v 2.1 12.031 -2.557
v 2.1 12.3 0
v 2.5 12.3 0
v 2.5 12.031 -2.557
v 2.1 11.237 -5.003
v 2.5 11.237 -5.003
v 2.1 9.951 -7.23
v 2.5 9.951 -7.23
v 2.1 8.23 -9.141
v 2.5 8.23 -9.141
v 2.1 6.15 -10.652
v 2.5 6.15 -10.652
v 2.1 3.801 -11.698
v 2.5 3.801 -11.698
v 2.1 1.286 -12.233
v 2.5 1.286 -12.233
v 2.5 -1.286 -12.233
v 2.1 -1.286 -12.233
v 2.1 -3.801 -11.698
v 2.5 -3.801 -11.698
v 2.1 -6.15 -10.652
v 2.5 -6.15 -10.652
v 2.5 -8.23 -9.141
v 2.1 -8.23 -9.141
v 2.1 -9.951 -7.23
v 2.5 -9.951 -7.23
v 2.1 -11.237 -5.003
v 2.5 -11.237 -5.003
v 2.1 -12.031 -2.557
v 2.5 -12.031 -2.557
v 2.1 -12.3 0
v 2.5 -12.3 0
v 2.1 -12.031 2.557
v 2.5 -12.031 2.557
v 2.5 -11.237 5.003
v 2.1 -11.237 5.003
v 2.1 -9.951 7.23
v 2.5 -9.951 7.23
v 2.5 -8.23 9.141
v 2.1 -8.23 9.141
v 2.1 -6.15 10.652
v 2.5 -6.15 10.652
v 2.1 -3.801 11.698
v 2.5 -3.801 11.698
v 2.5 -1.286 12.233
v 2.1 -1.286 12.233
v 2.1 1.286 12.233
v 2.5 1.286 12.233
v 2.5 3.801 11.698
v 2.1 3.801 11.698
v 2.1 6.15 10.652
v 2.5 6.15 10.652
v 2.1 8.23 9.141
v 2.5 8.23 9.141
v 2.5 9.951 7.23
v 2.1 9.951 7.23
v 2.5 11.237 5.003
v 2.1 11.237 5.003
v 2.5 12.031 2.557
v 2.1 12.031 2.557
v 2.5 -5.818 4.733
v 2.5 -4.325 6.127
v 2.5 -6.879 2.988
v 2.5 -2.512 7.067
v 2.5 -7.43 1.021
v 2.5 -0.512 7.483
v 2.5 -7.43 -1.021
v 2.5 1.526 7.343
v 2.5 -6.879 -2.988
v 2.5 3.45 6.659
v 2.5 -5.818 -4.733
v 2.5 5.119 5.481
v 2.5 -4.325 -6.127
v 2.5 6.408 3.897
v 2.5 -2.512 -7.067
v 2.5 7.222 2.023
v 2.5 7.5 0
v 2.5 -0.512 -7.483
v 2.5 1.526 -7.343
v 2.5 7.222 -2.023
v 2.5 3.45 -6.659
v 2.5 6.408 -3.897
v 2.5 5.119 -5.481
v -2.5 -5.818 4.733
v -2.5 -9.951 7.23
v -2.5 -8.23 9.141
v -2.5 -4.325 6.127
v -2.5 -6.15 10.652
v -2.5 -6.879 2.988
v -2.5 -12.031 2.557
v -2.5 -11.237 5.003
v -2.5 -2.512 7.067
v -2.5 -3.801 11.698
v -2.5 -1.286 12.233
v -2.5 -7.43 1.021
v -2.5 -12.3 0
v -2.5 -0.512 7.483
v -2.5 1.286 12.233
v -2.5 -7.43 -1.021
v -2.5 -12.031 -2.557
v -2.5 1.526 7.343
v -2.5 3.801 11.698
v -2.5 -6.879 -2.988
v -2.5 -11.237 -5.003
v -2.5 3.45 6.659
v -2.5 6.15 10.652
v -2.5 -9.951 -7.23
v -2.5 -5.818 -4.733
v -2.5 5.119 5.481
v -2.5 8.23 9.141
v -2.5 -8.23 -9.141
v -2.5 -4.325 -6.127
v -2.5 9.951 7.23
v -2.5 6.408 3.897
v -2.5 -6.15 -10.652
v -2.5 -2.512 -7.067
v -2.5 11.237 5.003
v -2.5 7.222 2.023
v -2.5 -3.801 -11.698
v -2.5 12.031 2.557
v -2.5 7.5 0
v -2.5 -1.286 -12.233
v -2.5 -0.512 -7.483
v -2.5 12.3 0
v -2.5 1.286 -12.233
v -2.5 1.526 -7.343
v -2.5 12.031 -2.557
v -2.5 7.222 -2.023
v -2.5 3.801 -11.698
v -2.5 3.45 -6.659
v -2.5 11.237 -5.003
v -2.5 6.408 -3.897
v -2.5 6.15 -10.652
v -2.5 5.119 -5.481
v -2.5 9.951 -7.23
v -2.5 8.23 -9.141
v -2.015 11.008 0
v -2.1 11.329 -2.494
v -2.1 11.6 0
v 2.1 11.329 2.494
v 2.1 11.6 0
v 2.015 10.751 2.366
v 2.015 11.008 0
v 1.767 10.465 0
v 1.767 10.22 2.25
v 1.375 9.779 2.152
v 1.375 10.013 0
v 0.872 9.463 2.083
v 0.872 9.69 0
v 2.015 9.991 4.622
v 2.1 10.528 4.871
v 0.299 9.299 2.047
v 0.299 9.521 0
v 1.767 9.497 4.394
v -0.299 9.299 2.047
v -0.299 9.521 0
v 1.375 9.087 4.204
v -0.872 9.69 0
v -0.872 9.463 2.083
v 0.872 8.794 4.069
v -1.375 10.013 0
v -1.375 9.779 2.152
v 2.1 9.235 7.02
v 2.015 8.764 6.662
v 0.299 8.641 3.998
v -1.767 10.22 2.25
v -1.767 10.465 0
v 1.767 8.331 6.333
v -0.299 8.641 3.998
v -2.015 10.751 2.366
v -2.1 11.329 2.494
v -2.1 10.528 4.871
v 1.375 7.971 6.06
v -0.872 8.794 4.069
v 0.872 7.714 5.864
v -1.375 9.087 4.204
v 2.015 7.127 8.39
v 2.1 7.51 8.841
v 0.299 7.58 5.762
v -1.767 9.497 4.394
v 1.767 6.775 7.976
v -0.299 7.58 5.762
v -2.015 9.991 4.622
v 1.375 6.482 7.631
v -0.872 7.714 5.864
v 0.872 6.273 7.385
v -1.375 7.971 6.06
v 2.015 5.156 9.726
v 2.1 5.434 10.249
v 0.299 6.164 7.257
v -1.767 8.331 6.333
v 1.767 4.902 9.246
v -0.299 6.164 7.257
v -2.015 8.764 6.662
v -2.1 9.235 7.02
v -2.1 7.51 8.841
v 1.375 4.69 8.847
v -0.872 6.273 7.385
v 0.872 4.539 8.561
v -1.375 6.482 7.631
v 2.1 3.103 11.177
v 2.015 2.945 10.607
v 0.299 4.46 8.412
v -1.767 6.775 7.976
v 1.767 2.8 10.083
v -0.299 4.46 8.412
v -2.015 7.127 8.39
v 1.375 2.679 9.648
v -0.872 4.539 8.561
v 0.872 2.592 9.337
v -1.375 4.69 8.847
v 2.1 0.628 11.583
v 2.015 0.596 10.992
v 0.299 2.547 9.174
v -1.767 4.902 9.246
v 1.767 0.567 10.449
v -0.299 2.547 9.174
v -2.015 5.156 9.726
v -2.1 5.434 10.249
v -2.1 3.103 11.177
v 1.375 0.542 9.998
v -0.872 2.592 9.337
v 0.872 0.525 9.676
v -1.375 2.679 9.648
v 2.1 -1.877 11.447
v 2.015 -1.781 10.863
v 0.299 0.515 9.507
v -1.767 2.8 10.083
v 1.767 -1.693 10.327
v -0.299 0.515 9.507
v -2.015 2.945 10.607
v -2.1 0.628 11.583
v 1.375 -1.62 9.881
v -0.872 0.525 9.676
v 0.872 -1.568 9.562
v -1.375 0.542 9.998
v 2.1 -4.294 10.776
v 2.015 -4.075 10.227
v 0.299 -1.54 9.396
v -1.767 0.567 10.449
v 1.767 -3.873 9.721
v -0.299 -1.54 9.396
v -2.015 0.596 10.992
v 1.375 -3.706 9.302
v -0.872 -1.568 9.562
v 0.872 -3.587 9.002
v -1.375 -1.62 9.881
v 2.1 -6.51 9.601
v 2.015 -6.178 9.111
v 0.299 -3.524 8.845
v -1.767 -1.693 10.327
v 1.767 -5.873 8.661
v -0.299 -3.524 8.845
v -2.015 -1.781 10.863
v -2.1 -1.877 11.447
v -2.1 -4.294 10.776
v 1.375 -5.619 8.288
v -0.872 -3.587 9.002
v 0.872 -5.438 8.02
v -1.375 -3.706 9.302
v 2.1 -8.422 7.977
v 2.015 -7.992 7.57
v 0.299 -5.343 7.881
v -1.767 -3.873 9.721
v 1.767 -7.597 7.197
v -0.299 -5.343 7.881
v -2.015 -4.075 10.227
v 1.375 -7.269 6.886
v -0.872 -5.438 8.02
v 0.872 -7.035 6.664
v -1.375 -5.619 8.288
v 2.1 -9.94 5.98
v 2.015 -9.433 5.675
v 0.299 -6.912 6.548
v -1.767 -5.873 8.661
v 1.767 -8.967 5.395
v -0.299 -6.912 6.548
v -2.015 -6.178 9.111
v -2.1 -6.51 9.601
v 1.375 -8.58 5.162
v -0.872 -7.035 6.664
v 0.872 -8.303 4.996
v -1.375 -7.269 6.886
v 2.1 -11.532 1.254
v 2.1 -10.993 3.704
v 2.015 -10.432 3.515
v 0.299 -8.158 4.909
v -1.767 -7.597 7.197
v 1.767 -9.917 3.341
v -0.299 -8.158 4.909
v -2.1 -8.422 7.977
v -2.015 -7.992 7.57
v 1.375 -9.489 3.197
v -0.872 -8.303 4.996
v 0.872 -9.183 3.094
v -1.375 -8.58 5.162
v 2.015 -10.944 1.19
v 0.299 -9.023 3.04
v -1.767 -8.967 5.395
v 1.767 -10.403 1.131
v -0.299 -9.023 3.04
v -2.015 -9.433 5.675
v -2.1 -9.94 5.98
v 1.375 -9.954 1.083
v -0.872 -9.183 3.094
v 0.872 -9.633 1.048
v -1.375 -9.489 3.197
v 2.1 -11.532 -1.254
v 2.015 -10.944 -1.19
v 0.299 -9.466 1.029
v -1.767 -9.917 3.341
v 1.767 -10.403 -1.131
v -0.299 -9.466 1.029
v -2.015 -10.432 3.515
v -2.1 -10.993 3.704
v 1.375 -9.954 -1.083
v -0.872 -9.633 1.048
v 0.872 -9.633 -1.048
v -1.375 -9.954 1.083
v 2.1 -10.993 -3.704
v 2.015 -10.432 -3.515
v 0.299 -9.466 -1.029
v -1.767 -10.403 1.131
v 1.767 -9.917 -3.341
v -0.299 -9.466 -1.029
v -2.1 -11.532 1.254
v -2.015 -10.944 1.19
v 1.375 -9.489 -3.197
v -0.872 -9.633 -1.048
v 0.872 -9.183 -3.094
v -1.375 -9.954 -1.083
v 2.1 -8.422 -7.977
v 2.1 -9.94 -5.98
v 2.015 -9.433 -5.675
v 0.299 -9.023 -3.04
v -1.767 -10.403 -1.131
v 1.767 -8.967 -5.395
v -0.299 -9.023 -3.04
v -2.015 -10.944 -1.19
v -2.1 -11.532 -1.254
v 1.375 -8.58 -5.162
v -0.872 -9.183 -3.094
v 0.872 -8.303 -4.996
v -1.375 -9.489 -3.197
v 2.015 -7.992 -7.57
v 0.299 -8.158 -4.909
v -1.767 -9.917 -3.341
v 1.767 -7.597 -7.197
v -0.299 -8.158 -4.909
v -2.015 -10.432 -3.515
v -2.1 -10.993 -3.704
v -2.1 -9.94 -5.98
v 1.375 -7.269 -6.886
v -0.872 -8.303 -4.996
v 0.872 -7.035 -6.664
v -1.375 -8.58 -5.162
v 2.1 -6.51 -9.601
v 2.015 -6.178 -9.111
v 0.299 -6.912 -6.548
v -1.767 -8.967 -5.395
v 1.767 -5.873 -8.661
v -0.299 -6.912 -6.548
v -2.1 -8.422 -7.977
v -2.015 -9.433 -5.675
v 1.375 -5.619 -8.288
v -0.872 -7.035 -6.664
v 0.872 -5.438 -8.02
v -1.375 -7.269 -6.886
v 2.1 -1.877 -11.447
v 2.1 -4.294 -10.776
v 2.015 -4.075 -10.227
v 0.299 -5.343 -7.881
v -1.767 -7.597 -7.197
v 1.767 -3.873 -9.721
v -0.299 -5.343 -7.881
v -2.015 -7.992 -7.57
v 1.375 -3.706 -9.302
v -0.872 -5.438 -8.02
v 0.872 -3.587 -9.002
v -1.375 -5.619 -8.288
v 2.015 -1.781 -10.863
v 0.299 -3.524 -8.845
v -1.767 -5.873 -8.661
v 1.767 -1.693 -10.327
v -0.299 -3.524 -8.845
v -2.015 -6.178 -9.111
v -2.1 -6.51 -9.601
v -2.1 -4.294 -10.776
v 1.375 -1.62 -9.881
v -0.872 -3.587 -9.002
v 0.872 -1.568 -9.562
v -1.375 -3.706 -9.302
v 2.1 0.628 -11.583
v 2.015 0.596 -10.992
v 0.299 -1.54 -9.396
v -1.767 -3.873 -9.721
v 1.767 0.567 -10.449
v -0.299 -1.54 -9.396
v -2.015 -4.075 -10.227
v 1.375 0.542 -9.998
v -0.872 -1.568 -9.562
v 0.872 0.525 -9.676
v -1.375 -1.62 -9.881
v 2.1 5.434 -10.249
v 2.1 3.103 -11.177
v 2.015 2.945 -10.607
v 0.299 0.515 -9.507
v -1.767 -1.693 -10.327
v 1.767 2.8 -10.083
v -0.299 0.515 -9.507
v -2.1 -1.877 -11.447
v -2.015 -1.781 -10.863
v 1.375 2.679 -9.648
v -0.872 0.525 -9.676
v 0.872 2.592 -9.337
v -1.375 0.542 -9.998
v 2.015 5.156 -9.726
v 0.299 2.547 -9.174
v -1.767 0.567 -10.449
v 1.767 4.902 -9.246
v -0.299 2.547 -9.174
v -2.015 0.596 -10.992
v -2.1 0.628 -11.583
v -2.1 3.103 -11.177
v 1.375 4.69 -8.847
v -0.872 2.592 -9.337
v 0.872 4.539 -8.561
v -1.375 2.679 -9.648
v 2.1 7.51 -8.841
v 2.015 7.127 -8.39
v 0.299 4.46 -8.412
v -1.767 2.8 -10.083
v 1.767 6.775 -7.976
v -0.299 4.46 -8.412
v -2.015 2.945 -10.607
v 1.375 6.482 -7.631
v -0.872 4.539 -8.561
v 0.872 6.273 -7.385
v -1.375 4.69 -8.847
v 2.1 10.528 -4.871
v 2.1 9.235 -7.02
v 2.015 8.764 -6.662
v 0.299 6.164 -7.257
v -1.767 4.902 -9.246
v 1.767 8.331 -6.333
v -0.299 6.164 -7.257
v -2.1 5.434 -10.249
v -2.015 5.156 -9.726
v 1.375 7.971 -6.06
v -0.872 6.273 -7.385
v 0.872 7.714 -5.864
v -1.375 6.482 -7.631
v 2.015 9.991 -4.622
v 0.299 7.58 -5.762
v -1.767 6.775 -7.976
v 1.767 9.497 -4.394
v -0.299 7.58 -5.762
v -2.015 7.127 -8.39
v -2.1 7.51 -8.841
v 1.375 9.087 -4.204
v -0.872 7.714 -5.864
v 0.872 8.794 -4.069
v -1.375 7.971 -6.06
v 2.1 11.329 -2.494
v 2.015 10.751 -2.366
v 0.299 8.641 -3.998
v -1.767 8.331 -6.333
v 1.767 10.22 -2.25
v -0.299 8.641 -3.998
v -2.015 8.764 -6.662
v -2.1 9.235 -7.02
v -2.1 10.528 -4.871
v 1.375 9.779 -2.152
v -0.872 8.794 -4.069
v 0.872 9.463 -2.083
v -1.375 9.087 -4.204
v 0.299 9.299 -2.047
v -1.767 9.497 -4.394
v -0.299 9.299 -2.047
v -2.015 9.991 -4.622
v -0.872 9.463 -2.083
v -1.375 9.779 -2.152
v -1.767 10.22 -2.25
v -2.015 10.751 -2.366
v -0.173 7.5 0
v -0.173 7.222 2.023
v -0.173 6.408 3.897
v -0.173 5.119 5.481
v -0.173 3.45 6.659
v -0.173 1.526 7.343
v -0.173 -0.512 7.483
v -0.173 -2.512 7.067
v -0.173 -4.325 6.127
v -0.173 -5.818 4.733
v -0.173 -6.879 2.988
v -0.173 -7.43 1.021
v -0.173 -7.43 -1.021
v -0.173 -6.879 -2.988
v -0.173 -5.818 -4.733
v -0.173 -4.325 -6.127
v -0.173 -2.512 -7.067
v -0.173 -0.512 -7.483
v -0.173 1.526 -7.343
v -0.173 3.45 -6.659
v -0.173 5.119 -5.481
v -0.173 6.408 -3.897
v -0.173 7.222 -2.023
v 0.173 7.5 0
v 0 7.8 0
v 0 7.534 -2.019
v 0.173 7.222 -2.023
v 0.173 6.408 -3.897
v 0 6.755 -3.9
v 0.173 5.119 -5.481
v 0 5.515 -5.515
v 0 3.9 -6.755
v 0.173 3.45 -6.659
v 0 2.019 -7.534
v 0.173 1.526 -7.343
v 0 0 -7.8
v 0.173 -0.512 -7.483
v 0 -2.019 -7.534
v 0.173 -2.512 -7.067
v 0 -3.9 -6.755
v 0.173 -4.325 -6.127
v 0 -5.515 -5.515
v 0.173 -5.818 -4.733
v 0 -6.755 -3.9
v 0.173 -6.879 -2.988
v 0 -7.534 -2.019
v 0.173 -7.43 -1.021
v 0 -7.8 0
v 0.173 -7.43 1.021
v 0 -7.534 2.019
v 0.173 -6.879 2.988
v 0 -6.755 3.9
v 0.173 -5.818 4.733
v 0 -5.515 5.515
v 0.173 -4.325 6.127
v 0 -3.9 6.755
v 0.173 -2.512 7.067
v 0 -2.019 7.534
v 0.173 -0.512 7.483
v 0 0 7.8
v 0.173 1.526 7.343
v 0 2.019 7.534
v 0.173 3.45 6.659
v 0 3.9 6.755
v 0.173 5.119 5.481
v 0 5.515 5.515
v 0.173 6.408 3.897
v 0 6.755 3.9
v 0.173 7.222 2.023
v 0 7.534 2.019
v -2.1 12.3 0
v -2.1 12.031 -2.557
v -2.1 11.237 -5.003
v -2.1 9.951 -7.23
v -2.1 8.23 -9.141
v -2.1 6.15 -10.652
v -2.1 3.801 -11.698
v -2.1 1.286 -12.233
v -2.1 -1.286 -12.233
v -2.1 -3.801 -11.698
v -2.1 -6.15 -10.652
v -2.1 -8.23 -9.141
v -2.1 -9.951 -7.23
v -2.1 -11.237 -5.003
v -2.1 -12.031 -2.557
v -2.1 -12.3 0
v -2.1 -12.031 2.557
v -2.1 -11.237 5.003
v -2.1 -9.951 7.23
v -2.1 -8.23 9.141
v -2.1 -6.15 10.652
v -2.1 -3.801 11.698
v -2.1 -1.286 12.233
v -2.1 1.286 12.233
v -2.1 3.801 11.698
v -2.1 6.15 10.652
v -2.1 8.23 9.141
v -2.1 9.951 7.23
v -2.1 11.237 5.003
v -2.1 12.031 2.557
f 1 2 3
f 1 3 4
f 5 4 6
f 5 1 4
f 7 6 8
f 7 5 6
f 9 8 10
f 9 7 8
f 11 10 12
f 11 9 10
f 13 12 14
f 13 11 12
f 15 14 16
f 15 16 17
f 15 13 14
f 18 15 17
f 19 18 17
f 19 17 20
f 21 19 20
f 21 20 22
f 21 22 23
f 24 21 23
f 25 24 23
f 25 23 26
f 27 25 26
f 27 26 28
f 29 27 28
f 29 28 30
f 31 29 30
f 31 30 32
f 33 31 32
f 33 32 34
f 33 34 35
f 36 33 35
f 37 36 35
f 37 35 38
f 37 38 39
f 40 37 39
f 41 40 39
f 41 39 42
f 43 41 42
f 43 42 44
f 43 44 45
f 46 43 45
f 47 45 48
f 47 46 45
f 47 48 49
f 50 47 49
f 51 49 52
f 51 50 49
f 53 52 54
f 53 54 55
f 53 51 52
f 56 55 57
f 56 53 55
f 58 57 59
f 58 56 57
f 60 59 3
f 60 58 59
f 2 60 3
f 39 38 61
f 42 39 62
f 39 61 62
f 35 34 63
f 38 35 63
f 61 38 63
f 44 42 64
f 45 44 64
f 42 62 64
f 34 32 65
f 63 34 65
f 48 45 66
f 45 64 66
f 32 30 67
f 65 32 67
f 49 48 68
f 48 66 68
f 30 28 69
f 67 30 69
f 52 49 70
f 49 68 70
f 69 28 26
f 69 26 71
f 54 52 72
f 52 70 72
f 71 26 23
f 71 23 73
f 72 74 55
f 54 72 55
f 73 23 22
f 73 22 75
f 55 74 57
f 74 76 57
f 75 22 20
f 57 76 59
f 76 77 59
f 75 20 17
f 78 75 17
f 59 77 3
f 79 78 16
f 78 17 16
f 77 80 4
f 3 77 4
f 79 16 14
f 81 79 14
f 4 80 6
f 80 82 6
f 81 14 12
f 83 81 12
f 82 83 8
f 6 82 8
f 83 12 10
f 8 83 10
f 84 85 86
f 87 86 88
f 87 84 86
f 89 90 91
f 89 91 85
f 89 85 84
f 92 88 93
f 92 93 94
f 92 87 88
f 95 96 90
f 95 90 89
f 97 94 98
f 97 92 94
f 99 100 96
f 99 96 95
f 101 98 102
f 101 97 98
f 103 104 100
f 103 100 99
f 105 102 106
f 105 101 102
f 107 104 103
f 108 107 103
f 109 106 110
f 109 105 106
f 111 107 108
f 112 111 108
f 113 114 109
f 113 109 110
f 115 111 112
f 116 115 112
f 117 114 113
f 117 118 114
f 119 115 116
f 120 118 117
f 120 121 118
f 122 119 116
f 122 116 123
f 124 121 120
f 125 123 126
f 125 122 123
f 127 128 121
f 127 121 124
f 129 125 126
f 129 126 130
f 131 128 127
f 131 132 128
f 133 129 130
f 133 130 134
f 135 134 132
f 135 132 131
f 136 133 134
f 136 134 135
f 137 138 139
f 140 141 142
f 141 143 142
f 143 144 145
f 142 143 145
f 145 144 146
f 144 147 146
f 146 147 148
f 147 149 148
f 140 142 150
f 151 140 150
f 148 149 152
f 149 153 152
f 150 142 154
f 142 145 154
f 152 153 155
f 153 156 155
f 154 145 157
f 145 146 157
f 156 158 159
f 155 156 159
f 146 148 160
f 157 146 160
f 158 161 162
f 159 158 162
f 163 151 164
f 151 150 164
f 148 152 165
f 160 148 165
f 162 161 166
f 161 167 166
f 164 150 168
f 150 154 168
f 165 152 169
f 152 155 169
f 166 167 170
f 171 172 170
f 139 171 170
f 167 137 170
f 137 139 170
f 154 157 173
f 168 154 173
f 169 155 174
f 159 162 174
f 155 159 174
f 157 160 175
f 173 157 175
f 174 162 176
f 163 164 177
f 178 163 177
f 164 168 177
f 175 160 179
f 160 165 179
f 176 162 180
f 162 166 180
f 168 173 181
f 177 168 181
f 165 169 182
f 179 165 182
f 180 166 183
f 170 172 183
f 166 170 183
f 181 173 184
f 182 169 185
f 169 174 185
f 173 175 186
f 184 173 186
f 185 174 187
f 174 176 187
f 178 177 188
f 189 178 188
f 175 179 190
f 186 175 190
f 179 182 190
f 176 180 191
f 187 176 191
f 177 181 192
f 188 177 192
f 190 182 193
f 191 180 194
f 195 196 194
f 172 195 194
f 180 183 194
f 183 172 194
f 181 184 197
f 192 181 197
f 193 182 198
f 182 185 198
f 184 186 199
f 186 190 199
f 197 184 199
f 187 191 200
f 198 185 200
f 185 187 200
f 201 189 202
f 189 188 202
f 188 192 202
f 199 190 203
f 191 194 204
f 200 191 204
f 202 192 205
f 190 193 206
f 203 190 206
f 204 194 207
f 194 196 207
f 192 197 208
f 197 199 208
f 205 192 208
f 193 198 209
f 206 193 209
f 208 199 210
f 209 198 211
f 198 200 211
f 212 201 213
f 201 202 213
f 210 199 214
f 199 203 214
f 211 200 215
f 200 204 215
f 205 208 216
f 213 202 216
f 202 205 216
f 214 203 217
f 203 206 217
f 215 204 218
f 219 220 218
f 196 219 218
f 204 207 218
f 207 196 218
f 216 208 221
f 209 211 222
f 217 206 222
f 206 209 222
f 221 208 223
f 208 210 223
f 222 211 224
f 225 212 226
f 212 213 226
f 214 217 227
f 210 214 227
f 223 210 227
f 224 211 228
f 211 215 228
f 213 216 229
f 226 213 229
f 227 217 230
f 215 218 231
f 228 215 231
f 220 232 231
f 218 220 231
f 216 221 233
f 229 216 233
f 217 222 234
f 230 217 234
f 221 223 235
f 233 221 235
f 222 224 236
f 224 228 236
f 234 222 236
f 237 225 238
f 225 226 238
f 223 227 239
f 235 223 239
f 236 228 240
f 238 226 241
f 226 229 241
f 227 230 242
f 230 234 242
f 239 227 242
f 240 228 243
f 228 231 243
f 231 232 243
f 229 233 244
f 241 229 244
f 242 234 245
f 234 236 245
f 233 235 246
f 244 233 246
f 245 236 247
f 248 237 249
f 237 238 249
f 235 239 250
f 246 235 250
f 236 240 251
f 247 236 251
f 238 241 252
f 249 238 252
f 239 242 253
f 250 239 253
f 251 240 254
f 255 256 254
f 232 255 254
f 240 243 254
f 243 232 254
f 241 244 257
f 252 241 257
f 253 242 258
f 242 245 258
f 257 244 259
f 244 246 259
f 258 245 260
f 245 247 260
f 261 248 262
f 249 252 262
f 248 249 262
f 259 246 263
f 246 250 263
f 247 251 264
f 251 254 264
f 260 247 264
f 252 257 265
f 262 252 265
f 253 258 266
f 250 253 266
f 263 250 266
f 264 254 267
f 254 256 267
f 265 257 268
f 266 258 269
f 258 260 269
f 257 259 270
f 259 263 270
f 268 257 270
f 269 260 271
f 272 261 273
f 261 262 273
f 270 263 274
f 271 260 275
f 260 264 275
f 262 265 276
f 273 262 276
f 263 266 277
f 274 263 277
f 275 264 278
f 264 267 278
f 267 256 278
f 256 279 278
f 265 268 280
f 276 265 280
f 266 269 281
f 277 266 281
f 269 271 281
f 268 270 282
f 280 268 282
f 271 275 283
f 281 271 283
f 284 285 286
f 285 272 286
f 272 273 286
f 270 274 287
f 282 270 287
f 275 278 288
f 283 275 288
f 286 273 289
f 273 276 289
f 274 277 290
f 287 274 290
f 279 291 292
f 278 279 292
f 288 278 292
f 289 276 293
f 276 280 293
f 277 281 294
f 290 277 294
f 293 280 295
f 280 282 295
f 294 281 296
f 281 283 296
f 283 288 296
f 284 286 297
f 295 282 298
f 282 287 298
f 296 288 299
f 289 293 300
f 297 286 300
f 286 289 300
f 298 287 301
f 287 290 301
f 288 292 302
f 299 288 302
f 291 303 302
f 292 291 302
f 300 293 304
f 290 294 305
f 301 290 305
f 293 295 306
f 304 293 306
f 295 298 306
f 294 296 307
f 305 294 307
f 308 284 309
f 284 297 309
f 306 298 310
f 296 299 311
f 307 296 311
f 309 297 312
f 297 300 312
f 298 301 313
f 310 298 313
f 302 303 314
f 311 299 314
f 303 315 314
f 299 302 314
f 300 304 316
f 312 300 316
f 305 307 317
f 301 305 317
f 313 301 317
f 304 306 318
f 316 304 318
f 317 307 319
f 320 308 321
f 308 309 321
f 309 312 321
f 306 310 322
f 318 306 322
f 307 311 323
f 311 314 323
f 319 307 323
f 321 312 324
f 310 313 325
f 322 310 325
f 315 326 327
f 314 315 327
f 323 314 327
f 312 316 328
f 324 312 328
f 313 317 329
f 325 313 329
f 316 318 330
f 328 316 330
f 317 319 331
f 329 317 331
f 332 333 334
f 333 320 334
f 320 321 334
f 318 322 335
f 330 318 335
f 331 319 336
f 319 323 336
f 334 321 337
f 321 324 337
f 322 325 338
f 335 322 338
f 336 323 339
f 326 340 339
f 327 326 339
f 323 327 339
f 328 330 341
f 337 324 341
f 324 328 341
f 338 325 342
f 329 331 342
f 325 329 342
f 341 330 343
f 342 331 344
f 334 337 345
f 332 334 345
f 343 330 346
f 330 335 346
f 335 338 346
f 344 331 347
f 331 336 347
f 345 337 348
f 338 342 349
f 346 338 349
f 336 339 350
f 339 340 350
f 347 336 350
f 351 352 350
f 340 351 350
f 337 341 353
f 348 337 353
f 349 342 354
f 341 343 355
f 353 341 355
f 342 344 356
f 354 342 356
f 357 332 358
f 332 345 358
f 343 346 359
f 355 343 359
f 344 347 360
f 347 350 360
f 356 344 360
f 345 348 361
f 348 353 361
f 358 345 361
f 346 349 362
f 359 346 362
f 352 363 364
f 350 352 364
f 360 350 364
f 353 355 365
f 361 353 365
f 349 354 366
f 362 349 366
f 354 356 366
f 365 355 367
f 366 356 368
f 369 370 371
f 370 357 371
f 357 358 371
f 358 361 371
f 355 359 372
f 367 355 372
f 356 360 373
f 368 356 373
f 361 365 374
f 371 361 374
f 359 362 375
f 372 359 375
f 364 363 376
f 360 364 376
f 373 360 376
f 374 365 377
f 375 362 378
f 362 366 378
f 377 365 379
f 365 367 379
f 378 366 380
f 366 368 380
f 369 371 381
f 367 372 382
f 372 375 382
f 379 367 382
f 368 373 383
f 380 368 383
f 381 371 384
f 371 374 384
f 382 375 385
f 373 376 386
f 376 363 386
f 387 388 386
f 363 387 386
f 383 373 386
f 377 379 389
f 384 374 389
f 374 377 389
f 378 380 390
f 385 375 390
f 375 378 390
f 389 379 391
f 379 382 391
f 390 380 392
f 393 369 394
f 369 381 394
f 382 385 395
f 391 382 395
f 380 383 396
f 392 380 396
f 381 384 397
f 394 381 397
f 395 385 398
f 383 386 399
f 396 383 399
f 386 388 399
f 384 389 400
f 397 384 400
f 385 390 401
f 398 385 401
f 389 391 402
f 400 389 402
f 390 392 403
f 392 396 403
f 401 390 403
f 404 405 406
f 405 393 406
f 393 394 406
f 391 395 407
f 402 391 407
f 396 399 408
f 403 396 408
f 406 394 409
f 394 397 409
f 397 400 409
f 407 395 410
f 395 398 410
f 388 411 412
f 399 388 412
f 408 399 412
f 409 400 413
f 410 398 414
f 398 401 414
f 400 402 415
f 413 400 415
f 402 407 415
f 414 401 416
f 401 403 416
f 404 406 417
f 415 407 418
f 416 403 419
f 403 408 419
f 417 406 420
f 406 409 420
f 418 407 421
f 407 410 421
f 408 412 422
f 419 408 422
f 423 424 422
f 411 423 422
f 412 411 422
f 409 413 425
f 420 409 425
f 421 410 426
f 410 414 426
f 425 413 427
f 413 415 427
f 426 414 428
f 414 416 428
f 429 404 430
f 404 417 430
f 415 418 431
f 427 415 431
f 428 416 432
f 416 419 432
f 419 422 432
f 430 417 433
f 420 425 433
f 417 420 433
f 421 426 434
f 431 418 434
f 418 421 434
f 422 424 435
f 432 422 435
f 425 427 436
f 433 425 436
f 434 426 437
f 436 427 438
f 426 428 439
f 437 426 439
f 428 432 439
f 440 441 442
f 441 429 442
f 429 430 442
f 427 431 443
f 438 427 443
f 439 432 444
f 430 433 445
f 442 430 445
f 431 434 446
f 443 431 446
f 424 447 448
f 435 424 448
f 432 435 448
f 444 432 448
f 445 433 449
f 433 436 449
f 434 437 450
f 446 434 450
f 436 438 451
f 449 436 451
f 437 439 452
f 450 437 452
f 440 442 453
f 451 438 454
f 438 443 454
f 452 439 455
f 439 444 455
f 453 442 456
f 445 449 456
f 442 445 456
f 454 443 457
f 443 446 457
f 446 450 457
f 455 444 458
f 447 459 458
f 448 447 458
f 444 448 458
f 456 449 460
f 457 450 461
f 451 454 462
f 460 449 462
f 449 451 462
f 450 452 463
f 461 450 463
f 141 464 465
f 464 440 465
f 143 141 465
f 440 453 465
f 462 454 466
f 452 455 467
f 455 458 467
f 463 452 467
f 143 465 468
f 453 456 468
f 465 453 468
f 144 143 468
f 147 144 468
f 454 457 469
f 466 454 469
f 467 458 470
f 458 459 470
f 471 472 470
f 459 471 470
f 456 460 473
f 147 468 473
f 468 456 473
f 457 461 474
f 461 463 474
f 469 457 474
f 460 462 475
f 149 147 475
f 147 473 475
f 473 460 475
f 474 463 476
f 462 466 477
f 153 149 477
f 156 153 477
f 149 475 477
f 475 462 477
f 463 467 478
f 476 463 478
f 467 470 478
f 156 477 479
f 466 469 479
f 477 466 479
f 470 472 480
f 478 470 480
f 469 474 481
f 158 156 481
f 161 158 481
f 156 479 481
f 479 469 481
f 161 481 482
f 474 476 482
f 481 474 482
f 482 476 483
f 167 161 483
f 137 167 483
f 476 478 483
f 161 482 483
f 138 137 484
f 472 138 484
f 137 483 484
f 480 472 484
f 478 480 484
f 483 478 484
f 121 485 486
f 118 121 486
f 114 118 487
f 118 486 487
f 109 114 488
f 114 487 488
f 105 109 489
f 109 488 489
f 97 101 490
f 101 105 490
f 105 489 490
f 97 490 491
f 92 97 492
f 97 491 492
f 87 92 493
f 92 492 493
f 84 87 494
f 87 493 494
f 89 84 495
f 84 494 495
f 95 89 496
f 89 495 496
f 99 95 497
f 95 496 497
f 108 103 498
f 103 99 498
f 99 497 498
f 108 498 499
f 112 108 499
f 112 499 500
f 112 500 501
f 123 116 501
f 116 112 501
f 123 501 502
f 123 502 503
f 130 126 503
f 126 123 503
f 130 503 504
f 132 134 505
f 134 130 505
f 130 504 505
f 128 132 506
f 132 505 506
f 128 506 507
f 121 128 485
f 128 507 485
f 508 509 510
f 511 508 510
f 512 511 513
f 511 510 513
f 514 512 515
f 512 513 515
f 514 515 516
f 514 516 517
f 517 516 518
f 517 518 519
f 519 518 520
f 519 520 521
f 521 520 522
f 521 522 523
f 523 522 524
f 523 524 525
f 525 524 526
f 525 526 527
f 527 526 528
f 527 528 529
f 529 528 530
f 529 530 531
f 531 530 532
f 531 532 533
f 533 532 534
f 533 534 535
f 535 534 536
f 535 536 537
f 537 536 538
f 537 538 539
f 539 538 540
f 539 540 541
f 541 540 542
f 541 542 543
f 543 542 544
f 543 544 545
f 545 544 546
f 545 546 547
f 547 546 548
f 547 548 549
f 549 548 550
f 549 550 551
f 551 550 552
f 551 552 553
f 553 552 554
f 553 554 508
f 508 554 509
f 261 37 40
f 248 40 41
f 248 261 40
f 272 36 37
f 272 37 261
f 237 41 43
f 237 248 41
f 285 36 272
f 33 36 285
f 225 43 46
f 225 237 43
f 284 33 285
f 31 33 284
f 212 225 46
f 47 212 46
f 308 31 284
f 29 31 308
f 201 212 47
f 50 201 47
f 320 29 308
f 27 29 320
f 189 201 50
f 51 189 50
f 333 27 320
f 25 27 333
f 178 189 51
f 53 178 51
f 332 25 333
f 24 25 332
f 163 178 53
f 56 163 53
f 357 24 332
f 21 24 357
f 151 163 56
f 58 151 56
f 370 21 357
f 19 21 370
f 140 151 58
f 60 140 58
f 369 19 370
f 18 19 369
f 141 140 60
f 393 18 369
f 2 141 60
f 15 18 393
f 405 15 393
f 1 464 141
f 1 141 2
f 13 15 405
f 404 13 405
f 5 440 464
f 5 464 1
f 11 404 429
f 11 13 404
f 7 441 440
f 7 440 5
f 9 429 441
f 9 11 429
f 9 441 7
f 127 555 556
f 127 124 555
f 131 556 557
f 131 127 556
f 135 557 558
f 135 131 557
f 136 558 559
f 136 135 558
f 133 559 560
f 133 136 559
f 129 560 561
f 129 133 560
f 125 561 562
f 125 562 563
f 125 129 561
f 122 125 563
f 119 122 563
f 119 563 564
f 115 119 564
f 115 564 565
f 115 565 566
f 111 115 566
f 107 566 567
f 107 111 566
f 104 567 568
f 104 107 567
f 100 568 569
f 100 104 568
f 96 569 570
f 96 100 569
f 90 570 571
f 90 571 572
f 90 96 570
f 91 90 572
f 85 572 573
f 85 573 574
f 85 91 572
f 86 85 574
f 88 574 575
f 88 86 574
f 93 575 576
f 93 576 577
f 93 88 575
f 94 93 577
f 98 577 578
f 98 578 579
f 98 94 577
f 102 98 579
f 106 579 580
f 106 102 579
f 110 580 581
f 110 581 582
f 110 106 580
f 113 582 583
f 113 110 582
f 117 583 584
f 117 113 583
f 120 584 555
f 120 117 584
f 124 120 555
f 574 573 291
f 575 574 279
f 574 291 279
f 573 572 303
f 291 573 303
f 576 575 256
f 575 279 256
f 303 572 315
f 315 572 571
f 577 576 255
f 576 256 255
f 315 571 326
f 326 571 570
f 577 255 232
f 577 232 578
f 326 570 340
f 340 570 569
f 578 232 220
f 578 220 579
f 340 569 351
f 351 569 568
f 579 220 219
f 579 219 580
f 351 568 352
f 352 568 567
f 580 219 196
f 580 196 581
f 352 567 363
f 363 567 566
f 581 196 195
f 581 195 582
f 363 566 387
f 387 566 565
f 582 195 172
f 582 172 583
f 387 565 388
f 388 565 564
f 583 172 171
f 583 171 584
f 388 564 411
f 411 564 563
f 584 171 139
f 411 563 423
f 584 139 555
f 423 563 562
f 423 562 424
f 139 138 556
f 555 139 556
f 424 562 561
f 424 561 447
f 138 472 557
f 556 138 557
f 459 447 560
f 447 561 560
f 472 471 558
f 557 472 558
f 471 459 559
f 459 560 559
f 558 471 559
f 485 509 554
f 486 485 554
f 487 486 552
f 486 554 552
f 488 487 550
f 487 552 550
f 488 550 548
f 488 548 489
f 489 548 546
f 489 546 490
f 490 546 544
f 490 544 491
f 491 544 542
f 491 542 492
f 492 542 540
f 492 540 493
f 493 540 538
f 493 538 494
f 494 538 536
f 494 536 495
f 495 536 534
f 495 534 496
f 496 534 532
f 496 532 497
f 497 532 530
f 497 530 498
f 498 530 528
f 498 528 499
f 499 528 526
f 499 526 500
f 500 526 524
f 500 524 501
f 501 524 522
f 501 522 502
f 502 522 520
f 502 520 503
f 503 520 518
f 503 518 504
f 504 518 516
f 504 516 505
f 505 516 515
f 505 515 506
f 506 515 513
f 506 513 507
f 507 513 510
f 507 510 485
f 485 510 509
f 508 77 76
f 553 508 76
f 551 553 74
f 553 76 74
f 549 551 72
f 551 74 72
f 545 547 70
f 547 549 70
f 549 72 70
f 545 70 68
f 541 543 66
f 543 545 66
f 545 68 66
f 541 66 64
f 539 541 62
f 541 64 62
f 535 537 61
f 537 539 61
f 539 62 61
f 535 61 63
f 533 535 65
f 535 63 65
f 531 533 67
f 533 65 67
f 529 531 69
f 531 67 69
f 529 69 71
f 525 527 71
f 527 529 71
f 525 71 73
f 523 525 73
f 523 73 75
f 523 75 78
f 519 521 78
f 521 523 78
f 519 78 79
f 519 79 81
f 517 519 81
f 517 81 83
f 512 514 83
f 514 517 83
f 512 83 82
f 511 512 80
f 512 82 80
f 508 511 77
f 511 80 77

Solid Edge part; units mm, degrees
sketch "Sketch1" plane through (0, 0, 0) normal (0, 0, 1) x (1, 0, 0)
  line L0 (-2.5, 12.3) -> (-2.5, 7.5)
  line L1 (-2.5, 7.5) -> (-0.1732, 7.5)
  line L2 (-0.1732, 7.5) -> (0, 7.8)
  line L3 (0, 7.8) -> (0.1732, 7.5)
  line L4 (0.1732, 7.5) -> (2.5, 7.5)
  line L5 (2.5, 7.5) -> (2.5, 12.3)
  line L6 (2.5, 12.3) -> (2.1, 12.3)
  line L7 (2.1, 12.3) -> (2.1, 11.6)
  arc A0 (2.1, 11.6) -> (-2.1, 11.6) centre (0, 11.6) cw
  line L8 (-2.1, 11.6) -> (-2.1, 12.3)
  line L9 (-2.1, 12.3) -> (-2.5, 12.3)
revolve "RevolvedProtrusion1" add sketch "Sketch1" angle 360 about axis through (2.5, 0, 0) along (-1, 0, 0)
